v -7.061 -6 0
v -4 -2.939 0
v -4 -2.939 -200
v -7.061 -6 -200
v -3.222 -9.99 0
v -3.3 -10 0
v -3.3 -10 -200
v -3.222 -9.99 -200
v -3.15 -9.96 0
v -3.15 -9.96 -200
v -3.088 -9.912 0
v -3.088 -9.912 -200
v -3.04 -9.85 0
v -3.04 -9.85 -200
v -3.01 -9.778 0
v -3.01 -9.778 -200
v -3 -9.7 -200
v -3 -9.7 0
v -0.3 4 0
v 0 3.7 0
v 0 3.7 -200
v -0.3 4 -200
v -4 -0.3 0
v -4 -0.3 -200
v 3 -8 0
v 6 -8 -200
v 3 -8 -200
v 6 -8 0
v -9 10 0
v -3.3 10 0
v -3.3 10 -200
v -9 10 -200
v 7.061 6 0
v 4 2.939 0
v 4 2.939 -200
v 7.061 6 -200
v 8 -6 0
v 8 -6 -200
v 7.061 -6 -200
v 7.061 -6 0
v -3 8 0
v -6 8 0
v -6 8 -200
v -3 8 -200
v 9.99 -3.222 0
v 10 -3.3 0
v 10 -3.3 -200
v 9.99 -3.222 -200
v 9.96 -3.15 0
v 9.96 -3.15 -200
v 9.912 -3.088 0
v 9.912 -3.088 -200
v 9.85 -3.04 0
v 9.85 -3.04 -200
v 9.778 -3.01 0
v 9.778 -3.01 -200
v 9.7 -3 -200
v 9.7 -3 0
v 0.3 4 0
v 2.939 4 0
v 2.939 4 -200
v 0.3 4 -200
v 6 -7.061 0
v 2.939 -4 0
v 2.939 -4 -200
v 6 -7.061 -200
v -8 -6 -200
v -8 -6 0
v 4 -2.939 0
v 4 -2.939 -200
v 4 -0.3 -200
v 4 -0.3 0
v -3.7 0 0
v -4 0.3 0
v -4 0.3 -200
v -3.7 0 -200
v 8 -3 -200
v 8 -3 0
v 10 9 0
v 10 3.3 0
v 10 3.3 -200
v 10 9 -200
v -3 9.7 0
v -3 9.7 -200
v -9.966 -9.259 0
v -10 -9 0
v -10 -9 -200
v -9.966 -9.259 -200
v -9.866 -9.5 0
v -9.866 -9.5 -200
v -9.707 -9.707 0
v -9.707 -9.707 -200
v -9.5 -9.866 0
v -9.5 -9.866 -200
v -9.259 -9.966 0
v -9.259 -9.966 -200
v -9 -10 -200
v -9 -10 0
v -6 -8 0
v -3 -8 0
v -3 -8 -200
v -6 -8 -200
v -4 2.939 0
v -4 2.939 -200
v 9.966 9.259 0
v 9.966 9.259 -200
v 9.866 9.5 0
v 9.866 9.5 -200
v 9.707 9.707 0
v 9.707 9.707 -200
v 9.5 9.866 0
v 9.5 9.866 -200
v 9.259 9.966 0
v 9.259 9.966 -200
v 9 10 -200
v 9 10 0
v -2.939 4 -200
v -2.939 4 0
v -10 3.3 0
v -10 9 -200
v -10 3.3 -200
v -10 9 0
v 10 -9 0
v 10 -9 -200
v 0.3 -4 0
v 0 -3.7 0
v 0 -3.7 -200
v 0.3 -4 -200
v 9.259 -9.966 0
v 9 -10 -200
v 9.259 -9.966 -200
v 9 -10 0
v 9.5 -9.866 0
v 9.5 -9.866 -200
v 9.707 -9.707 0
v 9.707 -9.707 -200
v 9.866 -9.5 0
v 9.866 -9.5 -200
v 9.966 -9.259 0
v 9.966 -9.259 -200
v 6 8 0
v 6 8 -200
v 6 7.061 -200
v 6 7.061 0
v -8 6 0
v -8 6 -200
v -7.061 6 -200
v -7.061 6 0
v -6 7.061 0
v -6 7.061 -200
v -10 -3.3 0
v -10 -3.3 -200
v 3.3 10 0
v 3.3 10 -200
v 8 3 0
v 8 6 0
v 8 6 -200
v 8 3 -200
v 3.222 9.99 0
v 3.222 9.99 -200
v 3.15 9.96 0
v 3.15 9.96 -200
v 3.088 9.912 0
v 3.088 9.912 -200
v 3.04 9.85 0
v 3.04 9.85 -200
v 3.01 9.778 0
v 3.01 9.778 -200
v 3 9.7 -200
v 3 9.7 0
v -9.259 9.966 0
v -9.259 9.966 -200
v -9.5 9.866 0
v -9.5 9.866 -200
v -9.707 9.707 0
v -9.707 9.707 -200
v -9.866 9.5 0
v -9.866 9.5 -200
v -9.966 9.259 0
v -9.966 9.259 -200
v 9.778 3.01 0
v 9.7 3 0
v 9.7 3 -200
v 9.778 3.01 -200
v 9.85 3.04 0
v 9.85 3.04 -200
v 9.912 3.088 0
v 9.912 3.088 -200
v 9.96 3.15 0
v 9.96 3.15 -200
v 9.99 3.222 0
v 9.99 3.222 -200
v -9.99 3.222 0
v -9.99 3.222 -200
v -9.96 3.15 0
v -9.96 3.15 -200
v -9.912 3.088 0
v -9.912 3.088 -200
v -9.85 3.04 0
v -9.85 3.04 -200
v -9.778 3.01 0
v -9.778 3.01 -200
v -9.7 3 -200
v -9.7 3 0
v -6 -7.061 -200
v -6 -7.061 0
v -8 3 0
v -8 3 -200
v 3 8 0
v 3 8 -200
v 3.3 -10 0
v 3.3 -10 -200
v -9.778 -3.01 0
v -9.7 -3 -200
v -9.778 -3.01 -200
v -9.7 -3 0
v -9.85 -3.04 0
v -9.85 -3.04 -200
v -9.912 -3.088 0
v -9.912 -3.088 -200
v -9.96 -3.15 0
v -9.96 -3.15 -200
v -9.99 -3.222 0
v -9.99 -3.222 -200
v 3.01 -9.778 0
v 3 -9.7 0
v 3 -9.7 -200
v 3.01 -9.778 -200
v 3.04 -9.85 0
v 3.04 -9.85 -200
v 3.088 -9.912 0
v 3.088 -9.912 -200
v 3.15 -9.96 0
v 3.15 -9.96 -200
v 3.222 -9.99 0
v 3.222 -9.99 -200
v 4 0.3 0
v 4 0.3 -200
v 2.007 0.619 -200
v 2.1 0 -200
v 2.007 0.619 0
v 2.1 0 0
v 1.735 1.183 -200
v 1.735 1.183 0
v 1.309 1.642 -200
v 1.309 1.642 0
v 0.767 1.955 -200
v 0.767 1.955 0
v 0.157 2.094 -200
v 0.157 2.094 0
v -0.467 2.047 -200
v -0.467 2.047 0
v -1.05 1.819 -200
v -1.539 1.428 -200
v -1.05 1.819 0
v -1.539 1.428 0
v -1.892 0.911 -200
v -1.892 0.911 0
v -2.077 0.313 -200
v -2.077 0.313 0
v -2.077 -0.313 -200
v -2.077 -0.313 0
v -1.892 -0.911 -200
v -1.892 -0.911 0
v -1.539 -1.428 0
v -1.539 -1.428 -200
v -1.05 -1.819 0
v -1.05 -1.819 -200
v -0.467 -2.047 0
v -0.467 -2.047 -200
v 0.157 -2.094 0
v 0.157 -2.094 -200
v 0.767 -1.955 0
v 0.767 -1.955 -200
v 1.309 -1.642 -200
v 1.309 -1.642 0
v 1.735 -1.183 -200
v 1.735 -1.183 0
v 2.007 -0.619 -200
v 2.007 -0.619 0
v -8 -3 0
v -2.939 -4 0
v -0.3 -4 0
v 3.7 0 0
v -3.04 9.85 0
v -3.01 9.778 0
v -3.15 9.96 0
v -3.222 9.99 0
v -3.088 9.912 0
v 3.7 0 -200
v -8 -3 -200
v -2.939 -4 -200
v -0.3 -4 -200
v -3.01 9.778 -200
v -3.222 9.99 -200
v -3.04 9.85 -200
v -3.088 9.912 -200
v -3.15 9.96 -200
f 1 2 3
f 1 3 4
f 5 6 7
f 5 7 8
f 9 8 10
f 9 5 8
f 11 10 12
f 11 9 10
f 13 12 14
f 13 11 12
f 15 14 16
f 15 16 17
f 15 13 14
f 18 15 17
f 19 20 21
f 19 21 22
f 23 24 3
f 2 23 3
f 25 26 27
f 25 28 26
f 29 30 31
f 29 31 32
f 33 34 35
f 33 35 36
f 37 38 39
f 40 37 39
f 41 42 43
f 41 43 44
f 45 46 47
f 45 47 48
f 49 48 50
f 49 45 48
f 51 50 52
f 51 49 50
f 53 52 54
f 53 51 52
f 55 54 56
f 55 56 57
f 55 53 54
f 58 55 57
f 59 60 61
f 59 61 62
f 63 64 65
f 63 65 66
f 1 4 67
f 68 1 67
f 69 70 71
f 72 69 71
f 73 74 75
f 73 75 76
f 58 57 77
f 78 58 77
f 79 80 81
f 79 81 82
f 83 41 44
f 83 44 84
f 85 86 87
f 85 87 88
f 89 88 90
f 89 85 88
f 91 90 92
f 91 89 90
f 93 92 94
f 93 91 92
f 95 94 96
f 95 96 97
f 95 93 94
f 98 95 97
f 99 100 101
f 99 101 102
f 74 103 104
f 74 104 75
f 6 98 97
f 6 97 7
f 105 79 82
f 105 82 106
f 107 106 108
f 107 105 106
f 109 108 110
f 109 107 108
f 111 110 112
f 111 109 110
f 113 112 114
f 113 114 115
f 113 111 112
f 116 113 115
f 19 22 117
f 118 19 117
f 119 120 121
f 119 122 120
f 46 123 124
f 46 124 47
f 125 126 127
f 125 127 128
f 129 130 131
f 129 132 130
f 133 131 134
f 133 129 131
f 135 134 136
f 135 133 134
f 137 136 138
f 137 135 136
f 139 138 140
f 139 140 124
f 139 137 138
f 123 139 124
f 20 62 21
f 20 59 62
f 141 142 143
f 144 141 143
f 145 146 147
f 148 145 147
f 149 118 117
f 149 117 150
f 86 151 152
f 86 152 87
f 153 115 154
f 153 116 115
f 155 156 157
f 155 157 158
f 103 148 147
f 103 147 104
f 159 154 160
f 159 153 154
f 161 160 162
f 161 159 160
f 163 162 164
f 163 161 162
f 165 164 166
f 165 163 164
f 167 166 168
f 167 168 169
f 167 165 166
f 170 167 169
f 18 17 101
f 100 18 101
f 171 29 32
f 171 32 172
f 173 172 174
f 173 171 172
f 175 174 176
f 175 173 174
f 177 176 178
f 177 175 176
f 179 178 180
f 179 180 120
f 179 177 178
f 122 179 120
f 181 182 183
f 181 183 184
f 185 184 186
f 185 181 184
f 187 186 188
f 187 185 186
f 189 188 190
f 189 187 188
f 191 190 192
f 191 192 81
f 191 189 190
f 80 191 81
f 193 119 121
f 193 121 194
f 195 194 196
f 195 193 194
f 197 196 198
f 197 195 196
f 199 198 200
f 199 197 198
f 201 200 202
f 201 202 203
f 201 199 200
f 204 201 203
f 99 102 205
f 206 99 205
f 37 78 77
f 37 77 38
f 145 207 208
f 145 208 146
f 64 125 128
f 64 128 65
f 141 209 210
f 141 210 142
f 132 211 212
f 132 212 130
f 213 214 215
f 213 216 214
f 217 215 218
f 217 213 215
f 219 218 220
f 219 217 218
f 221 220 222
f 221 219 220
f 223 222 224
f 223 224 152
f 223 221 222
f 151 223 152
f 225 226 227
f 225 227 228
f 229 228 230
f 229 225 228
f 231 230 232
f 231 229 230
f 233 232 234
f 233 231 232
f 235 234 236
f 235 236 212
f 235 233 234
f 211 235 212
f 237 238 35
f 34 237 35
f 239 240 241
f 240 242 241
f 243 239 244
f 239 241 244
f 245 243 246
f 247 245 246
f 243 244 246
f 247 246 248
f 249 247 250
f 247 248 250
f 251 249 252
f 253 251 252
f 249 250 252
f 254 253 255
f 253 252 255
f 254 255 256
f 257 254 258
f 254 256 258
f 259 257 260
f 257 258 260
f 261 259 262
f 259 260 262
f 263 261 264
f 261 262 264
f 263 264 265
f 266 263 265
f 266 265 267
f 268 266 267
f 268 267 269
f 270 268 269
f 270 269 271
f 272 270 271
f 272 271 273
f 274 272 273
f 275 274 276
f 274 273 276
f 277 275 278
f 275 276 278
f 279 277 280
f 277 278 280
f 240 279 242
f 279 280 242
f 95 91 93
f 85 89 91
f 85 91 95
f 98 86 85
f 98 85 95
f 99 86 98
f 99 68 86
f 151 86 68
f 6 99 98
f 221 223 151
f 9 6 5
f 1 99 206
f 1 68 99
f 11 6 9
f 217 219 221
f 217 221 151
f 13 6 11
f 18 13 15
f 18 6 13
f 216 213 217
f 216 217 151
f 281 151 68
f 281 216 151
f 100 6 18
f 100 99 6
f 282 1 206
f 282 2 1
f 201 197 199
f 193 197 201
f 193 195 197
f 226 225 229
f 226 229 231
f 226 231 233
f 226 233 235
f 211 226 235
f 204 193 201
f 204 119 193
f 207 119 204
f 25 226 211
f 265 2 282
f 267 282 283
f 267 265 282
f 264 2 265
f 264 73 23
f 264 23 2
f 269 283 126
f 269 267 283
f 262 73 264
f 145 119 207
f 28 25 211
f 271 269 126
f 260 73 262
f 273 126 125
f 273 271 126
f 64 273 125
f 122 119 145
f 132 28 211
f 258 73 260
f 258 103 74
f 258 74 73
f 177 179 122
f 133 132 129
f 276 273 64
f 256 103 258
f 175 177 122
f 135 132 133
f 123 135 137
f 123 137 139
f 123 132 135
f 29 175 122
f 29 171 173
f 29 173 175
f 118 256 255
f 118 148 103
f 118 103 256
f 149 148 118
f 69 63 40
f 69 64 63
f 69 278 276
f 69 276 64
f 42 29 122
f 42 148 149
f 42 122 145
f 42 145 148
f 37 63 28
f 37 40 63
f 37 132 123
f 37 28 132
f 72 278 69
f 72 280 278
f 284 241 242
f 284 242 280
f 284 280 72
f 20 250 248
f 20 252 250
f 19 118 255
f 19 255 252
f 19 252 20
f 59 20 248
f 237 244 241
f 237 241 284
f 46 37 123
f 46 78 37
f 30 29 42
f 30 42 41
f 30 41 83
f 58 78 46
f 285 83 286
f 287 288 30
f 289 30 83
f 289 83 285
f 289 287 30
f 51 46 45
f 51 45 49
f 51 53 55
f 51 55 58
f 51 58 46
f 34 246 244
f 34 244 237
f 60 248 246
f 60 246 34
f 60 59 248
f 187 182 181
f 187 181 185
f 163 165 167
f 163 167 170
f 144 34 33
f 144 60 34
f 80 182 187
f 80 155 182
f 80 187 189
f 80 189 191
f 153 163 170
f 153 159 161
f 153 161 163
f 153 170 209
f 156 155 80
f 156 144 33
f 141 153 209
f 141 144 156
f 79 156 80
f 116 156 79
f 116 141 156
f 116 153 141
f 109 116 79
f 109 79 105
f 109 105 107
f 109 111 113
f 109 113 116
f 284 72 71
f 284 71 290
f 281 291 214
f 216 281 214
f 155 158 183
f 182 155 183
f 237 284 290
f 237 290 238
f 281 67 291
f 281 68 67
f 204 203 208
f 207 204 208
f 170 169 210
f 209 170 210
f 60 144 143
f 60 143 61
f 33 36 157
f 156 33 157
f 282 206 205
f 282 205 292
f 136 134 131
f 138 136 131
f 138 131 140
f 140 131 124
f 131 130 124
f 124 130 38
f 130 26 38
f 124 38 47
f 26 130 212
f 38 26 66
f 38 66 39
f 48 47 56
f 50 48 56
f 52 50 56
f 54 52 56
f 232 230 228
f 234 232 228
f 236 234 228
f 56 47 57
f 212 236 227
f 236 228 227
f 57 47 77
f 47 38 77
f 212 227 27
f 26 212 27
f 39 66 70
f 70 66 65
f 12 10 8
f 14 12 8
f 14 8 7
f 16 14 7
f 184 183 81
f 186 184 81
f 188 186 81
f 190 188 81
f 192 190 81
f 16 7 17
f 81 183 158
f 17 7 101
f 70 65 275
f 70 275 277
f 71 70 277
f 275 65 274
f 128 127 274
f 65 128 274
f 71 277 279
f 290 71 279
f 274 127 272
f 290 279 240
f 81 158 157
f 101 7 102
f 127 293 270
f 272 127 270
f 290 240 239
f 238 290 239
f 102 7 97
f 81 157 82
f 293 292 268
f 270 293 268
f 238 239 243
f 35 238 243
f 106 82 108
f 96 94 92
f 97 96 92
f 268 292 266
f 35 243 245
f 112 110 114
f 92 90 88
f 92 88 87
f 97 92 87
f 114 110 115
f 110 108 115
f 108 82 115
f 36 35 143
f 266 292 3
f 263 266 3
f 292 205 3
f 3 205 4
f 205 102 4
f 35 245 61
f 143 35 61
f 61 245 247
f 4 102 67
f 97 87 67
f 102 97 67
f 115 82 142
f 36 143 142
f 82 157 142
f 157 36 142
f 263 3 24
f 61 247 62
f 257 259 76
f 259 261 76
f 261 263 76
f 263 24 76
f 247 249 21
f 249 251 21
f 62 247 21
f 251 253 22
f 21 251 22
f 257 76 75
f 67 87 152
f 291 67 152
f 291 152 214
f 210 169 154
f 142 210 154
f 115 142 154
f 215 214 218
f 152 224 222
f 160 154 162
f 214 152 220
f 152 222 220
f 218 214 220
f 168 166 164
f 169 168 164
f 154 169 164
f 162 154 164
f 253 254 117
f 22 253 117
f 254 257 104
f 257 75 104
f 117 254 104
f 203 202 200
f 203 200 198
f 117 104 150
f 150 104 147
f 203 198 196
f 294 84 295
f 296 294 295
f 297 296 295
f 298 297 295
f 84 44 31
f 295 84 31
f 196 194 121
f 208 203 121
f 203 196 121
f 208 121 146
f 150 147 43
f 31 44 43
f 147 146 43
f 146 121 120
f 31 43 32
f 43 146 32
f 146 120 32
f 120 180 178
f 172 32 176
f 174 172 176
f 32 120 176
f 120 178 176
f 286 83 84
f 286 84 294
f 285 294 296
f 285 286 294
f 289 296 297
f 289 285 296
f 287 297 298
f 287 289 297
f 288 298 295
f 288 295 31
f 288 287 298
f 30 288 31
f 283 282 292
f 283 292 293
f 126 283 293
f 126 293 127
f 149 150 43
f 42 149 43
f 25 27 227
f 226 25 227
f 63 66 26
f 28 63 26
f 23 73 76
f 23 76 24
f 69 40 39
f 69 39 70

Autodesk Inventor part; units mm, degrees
sketch "Sketch_5" plane through (0, 0, 0) normal (0, 0, 1) x (1, 0, 0)
  arc A0 (-10, 3.3) -> (-9.7, 3) centre (-9.7, 3.3) ccw
  line L0 (-9.7, 3) -> (-8, 3)
  line L1 (-8, 3) -> (-8, 6)
  line L2 (-8, 6) -> (-7.0607, 6)
  line L3 (-7.0607, 6) -> (-4, 2.9393)
  line L4 (-4, 2.9393) -> (-4, 0.3)
  line L5 (-4, 0.3) -> (-3.7, 0)
  line L6 (-3.7, 0) -> (-4, -0.3)
  line L7 (-4, -0.3) -> (-4, -2.9393)
  line L8 (-4, -2.9393) -> (-7.0607, -6)
  line L9 (-7.0607, -6) -> (-8, -6)
  line L10 (-8, -6) -> (-8, -3)
  line L11 (-8, -3) -> (-9.7, -3)
  arc A1 (-9.7, -3) -> (-10, -3.3) centre (-9.7, -3.3) ccw
  line L12 (-10, -3.3) -> (-10, -9)
  arc A2 (-10, -9) -> (-9, -10) centre (-9, -9) ccw
  line L13 (-9, -10) -> (-3.3, -10)
  arc A3 (-3.3, -10) -> (-3, -9.7) centre (-3.3, -9.7) ccw
  line L14 (-3, -9.7) -> (-3, -8)
  line L15 (-3, -8) -> (-6, -8)
  line L16 (-6, -8) -> (-6, -7.0607)
  line L17 (-6, -7.0607) -> (-2.9393, -4)
  line L18 (-2.9393, -4) -> (-0.3, -4)
  line L19 (-0.3, -4) -> (0, -3.7)
  line L20 (0, -3.7) -> (0.3, -4)
  line L21 (0.3, -4) -> (2.9393, -4)
  line L22 (2.9393, -4) -> (6, -7.0607)
  line L23 (6, -7.0607) -> (6, -8)
  line L24 (6, -8) -> (3, -8)
  line L25 (3, -8) -> (3, -9.7)
  arc A4 (3, -9.7) -> (3.3, -10) centre (3.3, -9.7) ccw
  line L26 (3.3, -10) -> (9, -10)
  arc A5 (9, -10) -> (10, -9) centre (9, -9) ccw
  line L27 (10, -9) -> (10, -3.3)
  arc A6 (10, -3.3) -> (9.7, -3) centre (9.7, -3.3) ccw
  line L28 (9.7, -3) -> (8, -3)
  line L29 (8, -3) -> (8, -6)
  line L30 (8, -6) -> (7.0607, -6)
  line L31 (7.0607, -6) -> (4, -2.9393)
  line L32 (4, -2.9393) -> (4, -0.3)
  line L33 (4, -0.3) -> (3.7, 0)
  line L34 (3.7, 0) -> (4, 0.3)
  line L35 (4, 0.3) -> (4, 2.9393)
  line L36 (4, 2.9393) -> (7.0607, 6)
  line L37 (7.0607, 6) -> (8, 6)
  line L38 (8, 6) -> (8, 3)
  line L39 (8, 3) -> (9.7, 3)
  arc A7 (9.7, 3) -> (10, 3.3) centre (9.7, 3.3) ccw
  line L40 (10, 3.3) -> (10, 9)
  arc A8 (10, 9) -> (9, 10) centre (9, 9) ccw
  line L41 (9, 10) -> (3.3, 10)
  arc A9 (3.3, 10) -> (3, 9.7) centre (3.3, 9.7) ccw
  line L42 (3, 9.7) -> (3, 8)
  line L43 (3, 8) -> (6, 8)
  line L44 (6, 8) -> (6, 7.0607)
  line L45 (6, 7.0607) -> (2.9393, 4)
  line L46 (2.9393, 4) -> (0.3, 4)
  line L47 (0.3, 4) -> (0, 3.7)
  line L48 (0, 3.7) -> (-0.3, 4)
  line L49 (-0.3, 4) -> (-2.9393, 4)
  line L50 (-2.9393, 4) -> (-6, 7.0607)
  line L51 (-6, 7.0607) -> (-6, 8)
  line L52 (-6, 8) -> (-3, 8)
  line L53 (-3, 8) -> (-3, 9.7)
  arc A10 (-3, 9.7) -> (-3.3, 10) centre (-3.3, 9.7) ccw
  line L54 (-3.3, 10) -> (-9, 10)
  arc A11 (-9, 10) -> (-10, 9) centre (-9, 9) ccw
  line L55 (-10, 9) -> (-10, 3.3)
  circle A12 centre (0, 0) radius 2.1
extrude "Extrusion1" add sketch "Sketch_5" against normal blind 1000
ref_plane "to_frame_XY" through (0, 0, 0) normal (0, 0, 1) x (1, 0, 0)
ref_plane "to_frame_YZ" through (0, 0, 0) normal (1, 0, 0) x (0, 1, 0)
ref_plane "to_frame_ZX" through (0, 0, 0) normal (0, 1, 0) x (0, 0, 1)
sketch "Sketch2" plane through (-10, -3.3, -1000) normal (-1, 0, 0) x (0, 0, 1)
  line L0 (-197.6604, -150.7885) -> (800, -150.7885)
  line L1 (800, -150.7885) -> (800, 147.9074)
  line L2 (800, 147.9074) -> (-197.6604, 147.9074)
  line L3 (-197.6604, 147.9074) -> (-197.6604, -150.7885)
  point P0 (1000, 3.3)
  dimension "d3" = 200
extrude "Extrusion2" cut sketch "Sketch2" against normal through all
equation "\"d0\" = L"
equation "\"L\" = 1000"
properties part number "2020 Extrusion 122mm"
